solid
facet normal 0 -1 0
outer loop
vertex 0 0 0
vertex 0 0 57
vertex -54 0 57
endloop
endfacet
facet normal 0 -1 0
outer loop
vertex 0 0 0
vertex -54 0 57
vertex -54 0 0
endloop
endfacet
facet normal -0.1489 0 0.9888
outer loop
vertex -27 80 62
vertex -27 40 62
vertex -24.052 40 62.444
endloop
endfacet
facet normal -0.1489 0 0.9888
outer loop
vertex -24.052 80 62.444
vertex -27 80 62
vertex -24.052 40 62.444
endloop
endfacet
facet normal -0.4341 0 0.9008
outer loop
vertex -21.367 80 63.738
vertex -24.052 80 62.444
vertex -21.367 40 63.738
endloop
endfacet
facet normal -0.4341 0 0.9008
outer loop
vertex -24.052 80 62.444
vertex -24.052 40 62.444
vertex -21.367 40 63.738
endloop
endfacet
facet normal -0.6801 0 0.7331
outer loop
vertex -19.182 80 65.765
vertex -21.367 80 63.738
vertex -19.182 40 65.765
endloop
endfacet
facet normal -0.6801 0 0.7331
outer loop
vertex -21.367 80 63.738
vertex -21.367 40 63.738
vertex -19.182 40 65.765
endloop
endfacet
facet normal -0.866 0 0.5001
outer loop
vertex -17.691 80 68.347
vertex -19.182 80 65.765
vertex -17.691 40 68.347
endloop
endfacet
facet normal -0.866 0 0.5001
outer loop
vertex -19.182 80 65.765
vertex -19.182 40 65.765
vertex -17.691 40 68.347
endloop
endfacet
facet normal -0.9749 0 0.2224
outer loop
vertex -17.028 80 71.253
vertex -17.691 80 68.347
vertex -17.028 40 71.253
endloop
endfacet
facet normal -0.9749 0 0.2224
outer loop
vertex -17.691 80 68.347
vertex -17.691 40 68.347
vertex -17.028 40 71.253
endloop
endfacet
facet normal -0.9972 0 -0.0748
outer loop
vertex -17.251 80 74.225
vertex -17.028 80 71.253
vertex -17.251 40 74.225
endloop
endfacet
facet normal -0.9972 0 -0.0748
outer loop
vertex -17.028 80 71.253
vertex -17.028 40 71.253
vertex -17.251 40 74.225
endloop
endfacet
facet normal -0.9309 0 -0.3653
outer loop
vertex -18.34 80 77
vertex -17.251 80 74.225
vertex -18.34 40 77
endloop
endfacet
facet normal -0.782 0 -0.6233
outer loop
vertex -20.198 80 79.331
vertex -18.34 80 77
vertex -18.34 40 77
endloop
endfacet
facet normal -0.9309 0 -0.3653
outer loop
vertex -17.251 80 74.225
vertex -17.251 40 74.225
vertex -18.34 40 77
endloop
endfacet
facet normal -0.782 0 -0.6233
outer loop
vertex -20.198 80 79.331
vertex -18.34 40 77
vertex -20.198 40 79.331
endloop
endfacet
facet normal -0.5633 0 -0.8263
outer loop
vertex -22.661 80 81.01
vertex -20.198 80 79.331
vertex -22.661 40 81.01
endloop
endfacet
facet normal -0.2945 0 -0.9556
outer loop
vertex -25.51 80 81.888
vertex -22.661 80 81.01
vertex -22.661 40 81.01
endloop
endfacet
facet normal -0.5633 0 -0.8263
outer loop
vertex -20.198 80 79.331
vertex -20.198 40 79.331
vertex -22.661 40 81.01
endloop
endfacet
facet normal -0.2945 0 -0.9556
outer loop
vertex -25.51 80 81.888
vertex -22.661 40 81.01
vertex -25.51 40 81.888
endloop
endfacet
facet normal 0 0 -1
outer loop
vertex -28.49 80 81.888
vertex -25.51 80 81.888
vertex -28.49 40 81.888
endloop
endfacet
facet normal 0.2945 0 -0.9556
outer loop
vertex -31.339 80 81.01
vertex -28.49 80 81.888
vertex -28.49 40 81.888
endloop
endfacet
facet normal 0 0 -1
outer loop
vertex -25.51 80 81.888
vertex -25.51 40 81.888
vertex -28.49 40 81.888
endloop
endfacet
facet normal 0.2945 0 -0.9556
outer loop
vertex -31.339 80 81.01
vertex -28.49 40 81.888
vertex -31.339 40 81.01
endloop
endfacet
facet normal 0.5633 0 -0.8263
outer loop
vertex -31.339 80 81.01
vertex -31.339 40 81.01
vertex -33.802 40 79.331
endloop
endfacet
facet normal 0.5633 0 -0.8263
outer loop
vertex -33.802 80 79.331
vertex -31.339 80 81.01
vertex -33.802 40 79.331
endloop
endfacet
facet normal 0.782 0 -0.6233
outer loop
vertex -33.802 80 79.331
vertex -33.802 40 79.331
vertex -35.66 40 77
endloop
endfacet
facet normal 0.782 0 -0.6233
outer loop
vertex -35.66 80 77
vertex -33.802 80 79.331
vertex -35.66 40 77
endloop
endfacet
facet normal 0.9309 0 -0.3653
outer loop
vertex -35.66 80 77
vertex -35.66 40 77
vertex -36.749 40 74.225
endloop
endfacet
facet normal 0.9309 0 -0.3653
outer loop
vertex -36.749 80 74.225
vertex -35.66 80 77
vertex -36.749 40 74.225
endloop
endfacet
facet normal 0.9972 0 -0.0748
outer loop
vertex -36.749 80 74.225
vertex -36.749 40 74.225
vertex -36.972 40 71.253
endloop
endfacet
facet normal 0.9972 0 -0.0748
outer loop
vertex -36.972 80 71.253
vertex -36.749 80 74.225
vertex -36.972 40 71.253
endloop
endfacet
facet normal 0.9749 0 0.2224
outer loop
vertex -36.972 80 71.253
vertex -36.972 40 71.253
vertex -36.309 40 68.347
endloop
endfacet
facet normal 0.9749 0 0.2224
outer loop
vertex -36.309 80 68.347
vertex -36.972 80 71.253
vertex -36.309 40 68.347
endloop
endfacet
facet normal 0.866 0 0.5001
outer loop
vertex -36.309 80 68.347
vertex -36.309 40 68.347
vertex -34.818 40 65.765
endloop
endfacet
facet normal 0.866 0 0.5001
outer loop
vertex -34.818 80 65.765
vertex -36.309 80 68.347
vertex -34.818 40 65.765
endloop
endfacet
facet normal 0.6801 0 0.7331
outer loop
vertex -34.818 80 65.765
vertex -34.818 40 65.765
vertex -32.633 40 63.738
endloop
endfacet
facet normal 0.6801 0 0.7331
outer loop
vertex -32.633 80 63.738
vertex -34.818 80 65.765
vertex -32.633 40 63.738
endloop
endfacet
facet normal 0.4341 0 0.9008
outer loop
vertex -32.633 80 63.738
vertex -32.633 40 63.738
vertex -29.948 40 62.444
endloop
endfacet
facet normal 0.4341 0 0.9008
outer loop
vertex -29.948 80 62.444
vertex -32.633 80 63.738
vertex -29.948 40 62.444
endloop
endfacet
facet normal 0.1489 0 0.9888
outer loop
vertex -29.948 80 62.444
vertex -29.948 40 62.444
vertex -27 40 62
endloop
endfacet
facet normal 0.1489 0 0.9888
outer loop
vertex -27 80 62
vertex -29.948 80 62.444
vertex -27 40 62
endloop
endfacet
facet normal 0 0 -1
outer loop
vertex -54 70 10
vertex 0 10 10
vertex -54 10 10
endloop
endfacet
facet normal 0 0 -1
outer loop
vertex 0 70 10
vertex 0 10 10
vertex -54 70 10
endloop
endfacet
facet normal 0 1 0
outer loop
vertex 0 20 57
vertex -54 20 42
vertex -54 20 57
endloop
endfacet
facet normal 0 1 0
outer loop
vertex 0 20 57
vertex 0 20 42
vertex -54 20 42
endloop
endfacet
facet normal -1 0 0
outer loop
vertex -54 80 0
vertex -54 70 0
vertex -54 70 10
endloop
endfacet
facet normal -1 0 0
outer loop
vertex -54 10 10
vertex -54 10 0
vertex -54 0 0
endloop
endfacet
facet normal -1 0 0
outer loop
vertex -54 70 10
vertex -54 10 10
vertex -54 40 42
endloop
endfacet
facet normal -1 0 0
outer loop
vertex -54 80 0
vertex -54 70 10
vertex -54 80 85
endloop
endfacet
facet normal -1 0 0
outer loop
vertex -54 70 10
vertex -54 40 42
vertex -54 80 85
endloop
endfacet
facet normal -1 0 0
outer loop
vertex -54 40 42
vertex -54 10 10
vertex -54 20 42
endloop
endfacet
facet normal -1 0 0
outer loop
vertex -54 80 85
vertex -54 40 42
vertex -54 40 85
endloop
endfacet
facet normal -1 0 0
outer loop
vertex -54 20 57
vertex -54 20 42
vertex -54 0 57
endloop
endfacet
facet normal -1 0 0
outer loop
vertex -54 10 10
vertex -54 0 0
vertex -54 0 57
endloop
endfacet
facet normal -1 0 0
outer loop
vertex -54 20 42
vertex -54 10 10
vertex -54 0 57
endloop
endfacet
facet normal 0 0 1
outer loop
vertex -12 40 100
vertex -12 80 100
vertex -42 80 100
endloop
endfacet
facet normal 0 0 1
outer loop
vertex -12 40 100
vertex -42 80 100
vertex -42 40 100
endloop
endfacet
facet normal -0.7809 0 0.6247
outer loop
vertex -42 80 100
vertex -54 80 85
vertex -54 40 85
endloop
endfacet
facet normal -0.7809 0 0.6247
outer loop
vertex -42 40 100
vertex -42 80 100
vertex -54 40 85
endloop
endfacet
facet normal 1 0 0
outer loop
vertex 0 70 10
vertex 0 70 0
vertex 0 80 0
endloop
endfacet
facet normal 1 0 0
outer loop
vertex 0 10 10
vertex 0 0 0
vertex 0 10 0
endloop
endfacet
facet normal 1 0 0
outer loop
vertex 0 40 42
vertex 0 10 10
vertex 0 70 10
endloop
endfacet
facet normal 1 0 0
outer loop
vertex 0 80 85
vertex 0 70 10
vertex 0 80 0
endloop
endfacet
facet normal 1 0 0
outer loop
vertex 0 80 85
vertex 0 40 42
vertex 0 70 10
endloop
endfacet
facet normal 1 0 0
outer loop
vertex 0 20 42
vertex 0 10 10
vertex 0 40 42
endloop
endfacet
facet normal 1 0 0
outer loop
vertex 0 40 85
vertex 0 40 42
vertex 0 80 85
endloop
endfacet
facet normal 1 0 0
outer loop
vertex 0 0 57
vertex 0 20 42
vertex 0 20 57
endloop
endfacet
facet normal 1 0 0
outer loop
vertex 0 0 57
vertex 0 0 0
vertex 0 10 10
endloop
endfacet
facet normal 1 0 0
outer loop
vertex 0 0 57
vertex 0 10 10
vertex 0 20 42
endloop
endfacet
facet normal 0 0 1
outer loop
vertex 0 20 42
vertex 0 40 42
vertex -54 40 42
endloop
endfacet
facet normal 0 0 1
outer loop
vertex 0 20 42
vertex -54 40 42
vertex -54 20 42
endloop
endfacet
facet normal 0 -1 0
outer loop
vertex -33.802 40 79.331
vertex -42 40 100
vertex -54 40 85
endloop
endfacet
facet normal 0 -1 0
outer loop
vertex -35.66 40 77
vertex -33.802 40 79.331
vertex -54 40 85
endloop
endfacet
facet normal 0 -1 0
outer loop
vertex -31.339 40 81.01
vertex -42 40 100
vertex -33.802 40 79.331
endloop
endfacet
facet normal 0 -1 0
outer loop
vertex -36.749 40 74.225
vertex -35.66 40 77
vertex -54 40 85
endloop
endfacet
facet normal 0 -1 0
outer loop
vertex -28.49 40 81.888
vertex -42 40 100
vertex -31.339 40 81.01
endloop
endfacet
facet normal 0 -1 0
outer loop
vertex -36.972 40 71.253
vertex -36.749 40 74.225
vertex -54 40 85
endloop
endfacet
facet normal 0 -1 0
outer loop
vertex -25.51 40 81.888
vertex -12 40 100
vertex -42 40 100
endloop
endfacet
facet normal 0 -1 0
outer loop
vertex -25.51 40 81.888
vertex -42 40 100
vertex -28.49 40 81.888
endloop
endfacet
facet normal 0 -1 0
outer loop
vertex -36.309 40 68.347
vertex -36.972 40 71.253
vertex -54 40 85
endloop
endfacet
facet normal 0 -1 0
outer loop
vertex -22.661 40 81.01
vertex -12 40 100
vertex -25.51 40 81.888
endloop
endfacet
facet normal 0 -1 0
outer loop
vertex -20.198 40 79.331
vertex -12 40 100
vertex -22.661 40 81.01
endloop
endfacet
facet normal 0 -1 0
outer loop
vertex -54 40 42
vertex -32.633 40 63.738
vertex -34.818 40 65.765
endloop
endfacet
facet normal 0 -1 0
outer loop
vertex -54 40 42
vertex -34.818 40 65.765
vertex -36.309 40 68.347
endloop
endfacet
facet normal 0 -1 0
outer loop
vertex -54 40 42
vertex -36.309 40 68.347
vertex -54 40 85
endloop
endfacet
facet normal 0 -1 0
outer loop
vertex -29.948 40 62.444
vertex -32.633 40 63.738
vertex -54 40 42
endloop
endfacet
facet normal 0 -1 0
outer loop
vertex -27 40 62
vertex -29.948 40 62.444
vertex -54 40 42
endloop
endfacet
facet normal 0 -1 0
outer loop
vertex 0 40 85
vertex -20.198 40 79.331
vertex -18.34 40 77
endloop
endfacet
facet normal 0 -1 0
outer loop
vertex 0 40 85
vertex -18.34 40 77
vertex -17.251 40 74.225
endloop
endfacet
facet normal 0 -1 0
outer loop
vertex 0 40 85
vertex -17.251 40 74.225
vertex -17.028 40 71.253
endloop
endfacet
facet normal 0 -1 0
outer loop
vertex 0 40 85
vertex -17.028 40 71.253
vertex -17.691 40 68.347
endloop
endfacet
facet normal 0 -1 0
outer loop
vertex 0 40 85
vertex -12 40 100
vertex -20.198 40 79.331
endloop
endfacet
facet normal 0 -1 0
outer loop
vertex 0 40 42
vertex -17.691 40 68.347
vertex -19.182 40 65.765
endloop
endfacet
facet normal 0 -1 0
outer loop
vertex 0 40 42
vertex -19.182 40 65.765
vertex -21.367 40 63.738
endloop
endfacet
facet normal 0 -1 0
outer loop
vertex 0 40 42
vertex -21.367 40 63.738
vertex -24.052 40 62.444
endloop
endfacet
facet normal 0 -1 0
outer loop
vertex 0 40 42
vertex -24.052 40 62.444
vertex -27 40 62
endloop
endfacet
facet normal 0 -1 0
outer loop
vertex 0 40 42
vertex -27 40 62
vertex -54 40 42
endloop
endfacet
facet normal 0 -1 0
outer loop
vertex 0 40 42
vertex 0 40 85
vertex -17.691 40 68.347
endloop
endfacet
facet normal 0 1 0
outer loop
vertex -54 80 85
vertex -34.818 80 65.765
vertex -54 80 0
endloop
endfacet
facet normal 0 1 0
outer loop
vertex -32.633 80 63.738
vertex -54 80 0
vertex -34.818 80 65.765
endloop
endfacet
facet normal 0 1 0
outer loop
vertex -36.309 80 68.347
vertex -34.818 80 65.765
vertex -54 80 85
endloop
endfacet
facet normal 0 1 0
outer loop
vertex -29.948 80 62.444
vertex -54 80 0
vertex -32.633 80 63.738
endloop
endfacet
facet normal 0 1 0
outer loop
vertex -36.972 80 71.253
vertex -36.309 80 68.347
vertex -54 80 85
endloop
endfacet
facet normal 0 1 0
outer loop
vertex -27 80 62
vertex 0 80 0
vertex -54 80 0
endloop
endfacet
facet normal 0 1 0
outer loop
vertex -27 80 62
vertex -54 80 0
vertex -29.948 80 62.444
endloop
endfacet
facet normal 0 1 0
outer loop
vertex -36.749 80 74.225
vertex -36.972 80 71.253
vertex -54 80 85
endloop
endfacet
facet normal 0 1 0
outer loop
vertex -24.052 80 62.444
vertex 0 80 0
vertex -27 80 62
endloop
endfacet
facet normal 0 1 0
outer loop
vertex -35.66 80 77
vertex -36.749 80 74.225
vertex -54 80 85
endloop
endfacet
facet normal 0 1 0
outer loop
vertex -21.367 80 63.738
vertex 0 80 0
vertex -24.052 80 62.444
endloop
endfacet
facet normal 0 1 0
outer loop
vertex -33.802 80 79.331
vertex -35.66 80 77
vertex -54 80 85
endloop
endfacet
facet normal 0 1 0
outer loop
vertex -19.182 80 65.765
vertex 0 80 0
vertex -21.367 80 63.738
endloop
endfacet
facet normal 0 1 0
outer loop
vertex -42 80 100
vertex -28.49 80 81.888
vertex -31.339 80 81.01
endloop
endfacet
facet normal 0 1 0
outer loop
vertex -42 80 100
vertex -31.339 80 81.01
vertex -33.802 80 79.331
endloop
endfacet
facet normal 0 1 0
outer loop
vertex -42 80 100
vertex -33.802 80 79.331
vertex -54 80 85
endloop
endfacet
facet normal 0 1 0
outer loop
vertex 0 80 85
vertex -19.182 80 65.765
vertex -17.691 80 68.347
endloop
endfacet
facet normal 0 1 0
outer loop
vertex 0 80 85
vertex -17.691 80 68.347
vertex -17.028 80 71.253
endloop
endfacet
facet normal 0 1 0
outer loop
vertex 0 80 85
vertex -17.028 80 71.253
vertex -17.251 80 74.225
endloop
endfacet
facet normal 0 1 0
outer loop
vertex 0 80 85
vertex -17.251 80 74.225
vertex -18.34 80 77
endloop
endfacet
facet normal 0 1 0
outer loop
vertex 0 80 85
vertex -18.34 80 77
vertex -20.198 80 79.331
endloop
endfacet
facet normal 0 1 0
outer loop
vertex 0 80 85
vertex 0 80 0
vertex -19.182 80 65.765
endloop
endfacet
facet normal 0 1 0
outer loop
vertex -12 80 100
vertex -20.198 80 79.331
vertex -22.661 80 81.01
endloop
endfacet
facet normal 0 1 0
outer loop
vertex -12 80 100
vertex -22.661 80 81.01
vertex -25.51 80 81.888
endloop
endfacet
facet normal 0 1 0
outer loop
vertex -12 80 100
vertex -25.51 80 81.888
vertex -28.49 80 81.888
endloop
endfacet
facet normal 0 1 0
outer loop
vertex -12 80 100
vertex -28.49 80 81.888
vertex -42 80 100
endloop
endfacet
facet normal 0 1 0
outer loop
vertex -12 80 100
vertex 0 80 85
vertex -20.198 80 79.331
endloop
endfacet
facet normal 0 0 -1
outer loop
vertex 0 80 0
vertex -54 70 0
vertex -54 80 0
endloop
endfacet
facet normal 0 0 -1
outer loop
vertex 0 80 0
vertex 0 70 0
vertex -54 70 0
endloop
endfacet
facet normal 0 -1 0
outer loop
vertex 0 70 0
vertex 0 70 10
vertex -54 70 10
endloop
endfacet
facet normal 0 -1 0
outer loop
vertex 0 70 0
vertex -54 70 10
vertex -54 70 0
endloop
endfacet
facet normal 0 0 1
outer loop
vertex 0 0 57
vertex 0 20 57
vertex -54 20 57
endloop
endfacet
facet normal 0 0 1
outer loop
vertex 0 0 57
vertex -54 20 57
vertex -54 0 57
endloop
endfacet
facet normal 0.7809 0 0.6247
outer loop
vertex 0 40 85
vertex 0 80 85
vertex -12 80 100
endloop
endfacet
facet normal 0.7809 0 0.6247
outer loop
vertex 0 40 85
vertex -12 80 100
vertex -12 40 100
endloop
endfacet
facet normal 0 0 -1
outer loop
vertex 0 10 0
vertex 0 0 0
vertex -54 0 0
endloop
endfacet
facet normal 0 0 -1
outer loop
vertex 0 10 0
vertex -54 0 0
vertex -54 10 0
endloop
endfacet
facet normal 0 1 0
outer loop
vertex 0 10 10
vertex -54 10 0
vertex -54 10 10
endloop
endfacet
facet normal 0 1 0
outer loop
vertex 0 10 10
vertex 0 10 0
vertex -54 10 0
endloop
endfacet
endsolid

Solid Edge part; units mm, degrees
sketch "Sketch1" plane through (0, 0, 0) normal (1, 0, 0) x (0, 1, 0)
  line L0 (20, 42) -> (20, 57)
  line L1 (20, 57) -> (0, 57)
  line L2 (0, 57) -> (0, 0)
  line L3 (0, 0) -> (10, 0)
  line L4 (10, 0) -> (10, 10)
  line L5 (10, 10) -> (70, 10)
  line L6 (70, 10) -> (70, 0)
  line L7 (70, 0) -> (80, 0)
  line L8 (80, 0) -> (80, 100)
  line L9 (80, 100) -> (40, 100)
  line L10 (40, 100) -> (40, 42)
  line L11 (40, 42) -> (20, 42)
extrude "ExtrudedProtrusion_1" add sketch "Sketch1" against normal blind 54
chamfer "Chamfer_1" distance 12 distance2 15 1 edges at (0, 60, 100) measured on face at (-44.46, 73.7333, 100)
chamfer "Chamfer_2" distance 12 distance2 15 1 edges at (-54, 60, 100) measured on face at (-46.58, 73.7333, 100)
hole "Hole_1" at (-27, 40, 72) direction (0, 1, 0) diameter 20 end up to next
